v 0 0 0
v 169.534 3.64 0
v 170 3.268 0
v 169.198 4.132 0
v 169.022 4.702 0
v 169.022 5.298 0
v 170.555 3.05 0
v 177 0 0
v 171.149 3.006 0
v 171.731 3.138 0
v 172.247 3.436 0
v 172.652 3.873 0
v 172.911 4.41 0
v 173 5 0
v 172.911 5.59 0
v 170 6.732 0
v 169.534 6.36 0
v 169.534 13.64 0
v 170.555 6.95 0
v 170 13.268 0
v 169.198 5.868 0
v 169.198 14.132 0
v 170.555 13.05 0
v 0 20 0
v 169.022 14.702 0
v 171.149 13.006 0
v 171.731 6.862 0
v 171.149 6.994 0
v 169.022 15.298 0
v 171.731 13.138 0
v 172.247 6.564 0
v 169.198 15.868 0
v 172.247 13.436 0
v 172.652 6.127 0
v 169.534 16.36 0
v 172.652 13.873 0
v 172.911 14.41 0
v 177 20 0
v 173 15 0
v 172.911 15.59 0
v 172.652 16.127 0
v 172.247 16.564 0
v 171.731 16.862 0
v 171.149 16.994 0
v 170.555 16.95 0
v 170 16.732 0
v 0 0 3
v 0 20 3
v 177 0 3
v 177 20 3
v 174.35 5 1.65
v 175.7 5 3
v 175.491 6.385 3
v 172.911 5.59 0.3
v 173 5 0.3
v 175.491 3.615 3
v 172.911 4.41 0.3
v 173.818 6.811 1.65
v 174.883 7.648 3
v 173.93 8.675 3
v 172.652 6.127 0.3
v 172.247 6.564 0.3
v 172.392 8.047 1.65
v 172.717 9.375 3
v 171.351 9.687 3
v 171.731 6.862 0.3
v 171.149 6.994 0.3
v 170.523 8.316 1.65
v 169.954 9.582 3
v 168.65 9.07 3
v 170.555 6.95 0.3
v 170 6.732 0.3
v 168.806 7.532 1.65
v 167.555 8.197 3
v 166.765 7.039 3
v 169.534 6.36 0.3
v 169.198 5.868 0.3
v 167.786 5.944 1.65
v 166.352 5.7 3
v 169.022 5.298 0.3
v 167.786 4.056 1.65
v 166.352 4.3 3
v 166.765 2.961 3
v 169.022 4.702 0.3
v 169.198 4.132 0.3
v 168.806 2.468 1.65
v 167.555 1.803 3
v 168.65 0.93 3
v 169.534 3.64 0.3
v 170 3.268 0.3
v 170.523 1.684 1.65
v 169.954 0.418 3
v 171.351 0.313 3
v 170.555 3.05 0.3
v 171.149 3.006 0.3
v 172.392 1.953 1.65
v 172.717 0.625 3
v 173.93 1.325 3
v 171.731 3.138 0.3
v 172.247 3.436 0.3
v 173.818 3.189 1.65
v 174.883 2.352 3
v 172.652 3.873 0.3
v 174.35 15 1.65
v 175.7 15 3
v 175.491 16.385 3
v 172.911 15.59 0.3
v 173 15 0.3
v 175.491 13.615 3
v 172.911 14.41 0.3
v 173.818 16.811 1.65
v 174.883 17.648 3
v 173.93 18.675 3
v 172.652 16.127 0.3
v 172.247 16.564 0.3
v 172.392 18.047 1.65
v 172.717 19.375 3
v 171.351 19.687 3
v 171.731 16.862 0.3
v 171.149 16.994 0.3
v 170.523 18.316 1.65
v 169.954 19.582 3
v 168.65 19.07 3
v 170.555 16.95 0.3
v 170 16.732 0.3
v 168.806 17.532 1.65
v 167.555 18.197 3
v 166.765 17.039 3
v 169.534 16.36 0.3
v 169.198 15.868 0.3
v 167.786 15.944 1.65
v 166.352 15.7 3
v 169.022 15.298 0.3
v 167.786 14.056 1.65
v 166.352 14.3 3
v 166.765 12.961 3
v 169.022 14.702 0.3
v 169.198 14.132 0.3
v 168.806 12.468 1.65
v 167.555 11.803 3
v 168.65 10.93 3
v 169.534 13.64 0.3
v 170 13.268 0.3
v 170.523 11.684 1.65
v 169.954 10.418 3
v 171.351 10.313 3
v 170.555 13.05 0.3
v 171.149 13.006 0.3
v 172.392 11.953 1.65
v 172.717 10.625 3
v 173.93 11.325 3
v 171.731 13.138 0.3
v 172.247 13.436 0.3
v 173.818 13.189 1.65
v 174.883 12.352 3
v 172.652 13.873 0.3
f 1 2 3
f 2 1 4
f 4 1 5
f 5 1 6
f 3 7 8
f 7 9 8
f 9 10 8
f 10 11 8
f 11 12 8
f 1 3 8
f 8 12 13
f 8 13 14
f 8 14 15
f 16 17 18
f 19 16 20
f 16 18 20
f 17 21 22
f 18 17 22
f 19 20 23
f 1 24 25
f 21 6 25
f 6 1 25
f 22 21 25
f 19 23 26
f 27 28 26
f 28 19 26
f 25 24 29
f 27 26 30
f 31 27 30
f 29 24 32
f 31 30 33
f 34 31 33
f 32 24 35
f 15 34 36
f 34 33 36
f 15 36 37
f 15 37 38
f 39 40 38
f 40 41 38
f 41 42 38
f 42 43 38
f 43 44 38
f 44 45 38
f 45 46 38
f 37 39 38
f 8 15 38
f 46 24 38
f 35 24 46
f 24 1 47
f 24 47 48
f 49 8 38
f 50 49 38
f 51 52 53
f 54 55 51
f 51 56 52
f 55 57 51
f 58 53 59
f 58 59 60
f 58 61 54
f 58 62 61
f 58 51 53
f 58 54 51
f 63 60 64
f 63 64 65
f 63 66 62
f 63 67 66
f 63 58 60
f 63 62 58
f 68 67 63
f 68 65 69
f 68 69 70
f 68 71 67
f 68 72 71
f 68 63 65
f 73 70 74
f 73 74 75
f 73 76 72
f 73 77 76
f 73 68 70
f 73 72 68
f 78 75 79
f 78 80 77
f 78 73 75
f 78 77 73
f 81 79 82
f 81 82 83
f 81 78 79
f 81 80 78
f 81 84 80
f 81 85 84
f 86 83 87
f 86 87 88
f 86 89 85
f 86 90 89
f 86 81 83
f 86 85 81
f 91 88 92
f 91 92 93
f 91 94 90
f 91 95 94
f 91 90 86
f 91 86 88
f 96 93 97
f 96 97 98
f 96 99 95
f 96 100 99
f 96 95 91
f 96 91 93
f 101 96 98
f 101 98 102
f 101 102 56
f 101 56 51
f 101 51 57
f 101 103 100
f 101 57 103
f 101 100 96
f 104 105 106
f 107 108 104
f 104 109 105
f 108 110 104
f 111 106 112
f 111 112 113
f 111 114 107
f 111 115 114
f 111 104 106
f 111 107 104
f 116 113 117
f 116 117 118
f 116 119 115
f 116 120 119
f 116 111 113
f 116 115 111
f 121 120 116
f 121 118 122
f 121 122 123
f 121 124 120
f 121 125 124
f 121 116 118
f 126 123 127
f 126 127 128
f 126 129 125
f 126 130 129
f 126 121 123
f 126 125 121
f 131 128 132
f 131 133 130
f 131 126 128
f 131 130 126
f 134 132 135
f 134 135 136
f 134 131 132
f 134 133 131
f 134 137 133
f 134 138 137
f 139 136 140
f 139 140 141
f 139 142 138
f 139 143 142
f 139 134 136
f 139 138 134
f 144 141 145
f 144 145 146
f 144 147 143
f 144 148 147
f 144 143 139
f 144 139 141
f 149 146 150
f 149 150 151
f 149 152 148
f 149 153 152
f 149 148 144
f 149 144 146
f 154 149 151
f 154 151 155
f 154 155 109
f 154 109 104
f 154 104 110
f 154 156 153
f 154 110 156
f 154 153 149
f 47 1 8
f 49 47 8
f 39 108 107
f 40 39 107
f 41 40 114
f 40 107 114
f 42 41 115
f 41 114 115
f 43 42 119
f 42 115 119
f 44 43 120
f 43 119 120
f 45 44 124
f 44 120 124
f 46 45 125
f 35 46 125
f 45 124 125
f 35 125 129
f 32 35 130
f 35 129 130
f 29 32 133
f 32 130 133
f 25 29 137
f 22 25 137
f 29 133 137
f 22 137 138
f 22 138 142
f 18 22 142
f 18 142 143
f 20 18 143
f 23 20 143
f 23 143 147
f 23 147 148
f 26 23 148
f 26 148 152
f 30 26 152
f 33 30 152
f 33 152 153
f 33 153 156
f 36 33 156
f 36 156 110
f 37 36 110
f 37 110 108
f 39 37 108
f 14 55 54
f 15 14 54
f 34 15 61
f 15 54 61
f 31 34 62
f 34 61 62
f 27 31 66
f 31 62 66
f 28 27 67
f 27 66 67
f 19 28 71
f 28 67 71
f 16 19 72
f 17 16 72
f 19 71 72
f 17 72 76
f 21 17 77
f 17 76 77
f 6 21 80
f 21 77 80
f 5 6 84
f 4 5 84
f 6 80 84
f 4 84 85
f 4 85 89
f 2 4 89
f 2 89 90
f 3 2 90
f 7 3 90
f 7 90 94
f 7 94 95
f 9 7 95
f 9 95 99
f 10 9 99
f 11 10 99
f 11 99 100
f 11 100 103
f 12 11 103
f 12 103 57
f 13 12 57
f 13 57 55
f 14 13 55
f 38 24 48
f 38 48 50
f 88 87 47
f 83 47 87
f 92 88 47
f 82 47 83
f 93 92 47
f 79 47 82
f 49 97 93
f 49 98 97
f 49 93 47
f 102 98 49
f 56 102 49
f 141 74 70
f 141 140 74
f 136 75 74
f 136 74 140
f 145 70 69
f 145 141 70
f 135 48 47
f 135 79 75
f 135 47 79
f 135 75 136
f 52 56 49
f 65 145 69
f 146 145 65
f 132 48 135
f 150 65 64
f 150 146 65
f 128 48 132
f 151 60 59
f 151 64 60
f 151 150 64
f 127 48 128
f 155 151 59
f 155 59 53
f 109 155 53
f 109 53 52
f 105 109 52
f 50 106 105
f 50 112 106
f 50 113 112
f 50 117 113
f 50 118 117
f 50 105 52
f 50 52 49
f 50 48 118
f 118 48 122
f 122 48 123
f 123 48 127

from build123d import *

# Parameters (mm, degrees)
SKIZZE1_W                       = 177
SKIZZE1_H                       = 20
AUFSATZ_LINEAR_AUSTRAGEN1_DEPTH = 3
SKIZZE3_R                       = 2
SCHNITT_LINEAR_AUSTRAGEN1_DEPTH = 8
FASE1_SIZE                      = 2.7
SKIZZE5_R                       = 2
SCHNITT_LINEAR_AUSTRAGEN2_DEPTH = 8
FASE2_SIZE                      = 2.7


with BuildPart() as part:
    # Skizze1 → Aufsatz-Linear austragen1 (new body)
    with BuildSketch(Plane.XY):
        with Locations((88.5, 10)):
            Rectangle(SKIZZE1_W, SKIZZE1_H)
    extrude(amount=AUFSATZ_LINEAR_AUSTRAGEN1_DEPTH)

    # Skizze3 → Schnitt-Linear austragen1 (cut)
    with BuildSketch(Plane.XY.offset(3)):
        with Locations((171, 5)):
            Circle(SKIZZE3_R)
    extrude(amount=-SCHNITT_LINEAR_AUSTRAGEN1_DEPTH, mode=Mode.SUBTRACT)

    # Fase1
    fase1_edges = [part.edges().sort_by_distance(p)[0] for p in [
        (169, 5, 3),
    ]]
    chamfer(fase1_edges, length=FASE1_SIZE)

    # Skizze5 → Schnitt-Linear austragen2 (cut)
    with BuildSketch(Plane.XY.offset(3)):
        with Locations((171, 15)):
            Circle(SKIZZE5_R)
    extrude(amount=-SCHNITT_LINEAR_AUSTRAGEN2_DEPTH, mode=Mode.SUBTRACT)

    # Fase2
    fase2_edges = [part.edges().sort_by_distance(p)[0] for p in [
        (169, 15, 3),
    ]]
    chamfer(fase2_edges, length=FASE2_SIZE)


solid = part.part
